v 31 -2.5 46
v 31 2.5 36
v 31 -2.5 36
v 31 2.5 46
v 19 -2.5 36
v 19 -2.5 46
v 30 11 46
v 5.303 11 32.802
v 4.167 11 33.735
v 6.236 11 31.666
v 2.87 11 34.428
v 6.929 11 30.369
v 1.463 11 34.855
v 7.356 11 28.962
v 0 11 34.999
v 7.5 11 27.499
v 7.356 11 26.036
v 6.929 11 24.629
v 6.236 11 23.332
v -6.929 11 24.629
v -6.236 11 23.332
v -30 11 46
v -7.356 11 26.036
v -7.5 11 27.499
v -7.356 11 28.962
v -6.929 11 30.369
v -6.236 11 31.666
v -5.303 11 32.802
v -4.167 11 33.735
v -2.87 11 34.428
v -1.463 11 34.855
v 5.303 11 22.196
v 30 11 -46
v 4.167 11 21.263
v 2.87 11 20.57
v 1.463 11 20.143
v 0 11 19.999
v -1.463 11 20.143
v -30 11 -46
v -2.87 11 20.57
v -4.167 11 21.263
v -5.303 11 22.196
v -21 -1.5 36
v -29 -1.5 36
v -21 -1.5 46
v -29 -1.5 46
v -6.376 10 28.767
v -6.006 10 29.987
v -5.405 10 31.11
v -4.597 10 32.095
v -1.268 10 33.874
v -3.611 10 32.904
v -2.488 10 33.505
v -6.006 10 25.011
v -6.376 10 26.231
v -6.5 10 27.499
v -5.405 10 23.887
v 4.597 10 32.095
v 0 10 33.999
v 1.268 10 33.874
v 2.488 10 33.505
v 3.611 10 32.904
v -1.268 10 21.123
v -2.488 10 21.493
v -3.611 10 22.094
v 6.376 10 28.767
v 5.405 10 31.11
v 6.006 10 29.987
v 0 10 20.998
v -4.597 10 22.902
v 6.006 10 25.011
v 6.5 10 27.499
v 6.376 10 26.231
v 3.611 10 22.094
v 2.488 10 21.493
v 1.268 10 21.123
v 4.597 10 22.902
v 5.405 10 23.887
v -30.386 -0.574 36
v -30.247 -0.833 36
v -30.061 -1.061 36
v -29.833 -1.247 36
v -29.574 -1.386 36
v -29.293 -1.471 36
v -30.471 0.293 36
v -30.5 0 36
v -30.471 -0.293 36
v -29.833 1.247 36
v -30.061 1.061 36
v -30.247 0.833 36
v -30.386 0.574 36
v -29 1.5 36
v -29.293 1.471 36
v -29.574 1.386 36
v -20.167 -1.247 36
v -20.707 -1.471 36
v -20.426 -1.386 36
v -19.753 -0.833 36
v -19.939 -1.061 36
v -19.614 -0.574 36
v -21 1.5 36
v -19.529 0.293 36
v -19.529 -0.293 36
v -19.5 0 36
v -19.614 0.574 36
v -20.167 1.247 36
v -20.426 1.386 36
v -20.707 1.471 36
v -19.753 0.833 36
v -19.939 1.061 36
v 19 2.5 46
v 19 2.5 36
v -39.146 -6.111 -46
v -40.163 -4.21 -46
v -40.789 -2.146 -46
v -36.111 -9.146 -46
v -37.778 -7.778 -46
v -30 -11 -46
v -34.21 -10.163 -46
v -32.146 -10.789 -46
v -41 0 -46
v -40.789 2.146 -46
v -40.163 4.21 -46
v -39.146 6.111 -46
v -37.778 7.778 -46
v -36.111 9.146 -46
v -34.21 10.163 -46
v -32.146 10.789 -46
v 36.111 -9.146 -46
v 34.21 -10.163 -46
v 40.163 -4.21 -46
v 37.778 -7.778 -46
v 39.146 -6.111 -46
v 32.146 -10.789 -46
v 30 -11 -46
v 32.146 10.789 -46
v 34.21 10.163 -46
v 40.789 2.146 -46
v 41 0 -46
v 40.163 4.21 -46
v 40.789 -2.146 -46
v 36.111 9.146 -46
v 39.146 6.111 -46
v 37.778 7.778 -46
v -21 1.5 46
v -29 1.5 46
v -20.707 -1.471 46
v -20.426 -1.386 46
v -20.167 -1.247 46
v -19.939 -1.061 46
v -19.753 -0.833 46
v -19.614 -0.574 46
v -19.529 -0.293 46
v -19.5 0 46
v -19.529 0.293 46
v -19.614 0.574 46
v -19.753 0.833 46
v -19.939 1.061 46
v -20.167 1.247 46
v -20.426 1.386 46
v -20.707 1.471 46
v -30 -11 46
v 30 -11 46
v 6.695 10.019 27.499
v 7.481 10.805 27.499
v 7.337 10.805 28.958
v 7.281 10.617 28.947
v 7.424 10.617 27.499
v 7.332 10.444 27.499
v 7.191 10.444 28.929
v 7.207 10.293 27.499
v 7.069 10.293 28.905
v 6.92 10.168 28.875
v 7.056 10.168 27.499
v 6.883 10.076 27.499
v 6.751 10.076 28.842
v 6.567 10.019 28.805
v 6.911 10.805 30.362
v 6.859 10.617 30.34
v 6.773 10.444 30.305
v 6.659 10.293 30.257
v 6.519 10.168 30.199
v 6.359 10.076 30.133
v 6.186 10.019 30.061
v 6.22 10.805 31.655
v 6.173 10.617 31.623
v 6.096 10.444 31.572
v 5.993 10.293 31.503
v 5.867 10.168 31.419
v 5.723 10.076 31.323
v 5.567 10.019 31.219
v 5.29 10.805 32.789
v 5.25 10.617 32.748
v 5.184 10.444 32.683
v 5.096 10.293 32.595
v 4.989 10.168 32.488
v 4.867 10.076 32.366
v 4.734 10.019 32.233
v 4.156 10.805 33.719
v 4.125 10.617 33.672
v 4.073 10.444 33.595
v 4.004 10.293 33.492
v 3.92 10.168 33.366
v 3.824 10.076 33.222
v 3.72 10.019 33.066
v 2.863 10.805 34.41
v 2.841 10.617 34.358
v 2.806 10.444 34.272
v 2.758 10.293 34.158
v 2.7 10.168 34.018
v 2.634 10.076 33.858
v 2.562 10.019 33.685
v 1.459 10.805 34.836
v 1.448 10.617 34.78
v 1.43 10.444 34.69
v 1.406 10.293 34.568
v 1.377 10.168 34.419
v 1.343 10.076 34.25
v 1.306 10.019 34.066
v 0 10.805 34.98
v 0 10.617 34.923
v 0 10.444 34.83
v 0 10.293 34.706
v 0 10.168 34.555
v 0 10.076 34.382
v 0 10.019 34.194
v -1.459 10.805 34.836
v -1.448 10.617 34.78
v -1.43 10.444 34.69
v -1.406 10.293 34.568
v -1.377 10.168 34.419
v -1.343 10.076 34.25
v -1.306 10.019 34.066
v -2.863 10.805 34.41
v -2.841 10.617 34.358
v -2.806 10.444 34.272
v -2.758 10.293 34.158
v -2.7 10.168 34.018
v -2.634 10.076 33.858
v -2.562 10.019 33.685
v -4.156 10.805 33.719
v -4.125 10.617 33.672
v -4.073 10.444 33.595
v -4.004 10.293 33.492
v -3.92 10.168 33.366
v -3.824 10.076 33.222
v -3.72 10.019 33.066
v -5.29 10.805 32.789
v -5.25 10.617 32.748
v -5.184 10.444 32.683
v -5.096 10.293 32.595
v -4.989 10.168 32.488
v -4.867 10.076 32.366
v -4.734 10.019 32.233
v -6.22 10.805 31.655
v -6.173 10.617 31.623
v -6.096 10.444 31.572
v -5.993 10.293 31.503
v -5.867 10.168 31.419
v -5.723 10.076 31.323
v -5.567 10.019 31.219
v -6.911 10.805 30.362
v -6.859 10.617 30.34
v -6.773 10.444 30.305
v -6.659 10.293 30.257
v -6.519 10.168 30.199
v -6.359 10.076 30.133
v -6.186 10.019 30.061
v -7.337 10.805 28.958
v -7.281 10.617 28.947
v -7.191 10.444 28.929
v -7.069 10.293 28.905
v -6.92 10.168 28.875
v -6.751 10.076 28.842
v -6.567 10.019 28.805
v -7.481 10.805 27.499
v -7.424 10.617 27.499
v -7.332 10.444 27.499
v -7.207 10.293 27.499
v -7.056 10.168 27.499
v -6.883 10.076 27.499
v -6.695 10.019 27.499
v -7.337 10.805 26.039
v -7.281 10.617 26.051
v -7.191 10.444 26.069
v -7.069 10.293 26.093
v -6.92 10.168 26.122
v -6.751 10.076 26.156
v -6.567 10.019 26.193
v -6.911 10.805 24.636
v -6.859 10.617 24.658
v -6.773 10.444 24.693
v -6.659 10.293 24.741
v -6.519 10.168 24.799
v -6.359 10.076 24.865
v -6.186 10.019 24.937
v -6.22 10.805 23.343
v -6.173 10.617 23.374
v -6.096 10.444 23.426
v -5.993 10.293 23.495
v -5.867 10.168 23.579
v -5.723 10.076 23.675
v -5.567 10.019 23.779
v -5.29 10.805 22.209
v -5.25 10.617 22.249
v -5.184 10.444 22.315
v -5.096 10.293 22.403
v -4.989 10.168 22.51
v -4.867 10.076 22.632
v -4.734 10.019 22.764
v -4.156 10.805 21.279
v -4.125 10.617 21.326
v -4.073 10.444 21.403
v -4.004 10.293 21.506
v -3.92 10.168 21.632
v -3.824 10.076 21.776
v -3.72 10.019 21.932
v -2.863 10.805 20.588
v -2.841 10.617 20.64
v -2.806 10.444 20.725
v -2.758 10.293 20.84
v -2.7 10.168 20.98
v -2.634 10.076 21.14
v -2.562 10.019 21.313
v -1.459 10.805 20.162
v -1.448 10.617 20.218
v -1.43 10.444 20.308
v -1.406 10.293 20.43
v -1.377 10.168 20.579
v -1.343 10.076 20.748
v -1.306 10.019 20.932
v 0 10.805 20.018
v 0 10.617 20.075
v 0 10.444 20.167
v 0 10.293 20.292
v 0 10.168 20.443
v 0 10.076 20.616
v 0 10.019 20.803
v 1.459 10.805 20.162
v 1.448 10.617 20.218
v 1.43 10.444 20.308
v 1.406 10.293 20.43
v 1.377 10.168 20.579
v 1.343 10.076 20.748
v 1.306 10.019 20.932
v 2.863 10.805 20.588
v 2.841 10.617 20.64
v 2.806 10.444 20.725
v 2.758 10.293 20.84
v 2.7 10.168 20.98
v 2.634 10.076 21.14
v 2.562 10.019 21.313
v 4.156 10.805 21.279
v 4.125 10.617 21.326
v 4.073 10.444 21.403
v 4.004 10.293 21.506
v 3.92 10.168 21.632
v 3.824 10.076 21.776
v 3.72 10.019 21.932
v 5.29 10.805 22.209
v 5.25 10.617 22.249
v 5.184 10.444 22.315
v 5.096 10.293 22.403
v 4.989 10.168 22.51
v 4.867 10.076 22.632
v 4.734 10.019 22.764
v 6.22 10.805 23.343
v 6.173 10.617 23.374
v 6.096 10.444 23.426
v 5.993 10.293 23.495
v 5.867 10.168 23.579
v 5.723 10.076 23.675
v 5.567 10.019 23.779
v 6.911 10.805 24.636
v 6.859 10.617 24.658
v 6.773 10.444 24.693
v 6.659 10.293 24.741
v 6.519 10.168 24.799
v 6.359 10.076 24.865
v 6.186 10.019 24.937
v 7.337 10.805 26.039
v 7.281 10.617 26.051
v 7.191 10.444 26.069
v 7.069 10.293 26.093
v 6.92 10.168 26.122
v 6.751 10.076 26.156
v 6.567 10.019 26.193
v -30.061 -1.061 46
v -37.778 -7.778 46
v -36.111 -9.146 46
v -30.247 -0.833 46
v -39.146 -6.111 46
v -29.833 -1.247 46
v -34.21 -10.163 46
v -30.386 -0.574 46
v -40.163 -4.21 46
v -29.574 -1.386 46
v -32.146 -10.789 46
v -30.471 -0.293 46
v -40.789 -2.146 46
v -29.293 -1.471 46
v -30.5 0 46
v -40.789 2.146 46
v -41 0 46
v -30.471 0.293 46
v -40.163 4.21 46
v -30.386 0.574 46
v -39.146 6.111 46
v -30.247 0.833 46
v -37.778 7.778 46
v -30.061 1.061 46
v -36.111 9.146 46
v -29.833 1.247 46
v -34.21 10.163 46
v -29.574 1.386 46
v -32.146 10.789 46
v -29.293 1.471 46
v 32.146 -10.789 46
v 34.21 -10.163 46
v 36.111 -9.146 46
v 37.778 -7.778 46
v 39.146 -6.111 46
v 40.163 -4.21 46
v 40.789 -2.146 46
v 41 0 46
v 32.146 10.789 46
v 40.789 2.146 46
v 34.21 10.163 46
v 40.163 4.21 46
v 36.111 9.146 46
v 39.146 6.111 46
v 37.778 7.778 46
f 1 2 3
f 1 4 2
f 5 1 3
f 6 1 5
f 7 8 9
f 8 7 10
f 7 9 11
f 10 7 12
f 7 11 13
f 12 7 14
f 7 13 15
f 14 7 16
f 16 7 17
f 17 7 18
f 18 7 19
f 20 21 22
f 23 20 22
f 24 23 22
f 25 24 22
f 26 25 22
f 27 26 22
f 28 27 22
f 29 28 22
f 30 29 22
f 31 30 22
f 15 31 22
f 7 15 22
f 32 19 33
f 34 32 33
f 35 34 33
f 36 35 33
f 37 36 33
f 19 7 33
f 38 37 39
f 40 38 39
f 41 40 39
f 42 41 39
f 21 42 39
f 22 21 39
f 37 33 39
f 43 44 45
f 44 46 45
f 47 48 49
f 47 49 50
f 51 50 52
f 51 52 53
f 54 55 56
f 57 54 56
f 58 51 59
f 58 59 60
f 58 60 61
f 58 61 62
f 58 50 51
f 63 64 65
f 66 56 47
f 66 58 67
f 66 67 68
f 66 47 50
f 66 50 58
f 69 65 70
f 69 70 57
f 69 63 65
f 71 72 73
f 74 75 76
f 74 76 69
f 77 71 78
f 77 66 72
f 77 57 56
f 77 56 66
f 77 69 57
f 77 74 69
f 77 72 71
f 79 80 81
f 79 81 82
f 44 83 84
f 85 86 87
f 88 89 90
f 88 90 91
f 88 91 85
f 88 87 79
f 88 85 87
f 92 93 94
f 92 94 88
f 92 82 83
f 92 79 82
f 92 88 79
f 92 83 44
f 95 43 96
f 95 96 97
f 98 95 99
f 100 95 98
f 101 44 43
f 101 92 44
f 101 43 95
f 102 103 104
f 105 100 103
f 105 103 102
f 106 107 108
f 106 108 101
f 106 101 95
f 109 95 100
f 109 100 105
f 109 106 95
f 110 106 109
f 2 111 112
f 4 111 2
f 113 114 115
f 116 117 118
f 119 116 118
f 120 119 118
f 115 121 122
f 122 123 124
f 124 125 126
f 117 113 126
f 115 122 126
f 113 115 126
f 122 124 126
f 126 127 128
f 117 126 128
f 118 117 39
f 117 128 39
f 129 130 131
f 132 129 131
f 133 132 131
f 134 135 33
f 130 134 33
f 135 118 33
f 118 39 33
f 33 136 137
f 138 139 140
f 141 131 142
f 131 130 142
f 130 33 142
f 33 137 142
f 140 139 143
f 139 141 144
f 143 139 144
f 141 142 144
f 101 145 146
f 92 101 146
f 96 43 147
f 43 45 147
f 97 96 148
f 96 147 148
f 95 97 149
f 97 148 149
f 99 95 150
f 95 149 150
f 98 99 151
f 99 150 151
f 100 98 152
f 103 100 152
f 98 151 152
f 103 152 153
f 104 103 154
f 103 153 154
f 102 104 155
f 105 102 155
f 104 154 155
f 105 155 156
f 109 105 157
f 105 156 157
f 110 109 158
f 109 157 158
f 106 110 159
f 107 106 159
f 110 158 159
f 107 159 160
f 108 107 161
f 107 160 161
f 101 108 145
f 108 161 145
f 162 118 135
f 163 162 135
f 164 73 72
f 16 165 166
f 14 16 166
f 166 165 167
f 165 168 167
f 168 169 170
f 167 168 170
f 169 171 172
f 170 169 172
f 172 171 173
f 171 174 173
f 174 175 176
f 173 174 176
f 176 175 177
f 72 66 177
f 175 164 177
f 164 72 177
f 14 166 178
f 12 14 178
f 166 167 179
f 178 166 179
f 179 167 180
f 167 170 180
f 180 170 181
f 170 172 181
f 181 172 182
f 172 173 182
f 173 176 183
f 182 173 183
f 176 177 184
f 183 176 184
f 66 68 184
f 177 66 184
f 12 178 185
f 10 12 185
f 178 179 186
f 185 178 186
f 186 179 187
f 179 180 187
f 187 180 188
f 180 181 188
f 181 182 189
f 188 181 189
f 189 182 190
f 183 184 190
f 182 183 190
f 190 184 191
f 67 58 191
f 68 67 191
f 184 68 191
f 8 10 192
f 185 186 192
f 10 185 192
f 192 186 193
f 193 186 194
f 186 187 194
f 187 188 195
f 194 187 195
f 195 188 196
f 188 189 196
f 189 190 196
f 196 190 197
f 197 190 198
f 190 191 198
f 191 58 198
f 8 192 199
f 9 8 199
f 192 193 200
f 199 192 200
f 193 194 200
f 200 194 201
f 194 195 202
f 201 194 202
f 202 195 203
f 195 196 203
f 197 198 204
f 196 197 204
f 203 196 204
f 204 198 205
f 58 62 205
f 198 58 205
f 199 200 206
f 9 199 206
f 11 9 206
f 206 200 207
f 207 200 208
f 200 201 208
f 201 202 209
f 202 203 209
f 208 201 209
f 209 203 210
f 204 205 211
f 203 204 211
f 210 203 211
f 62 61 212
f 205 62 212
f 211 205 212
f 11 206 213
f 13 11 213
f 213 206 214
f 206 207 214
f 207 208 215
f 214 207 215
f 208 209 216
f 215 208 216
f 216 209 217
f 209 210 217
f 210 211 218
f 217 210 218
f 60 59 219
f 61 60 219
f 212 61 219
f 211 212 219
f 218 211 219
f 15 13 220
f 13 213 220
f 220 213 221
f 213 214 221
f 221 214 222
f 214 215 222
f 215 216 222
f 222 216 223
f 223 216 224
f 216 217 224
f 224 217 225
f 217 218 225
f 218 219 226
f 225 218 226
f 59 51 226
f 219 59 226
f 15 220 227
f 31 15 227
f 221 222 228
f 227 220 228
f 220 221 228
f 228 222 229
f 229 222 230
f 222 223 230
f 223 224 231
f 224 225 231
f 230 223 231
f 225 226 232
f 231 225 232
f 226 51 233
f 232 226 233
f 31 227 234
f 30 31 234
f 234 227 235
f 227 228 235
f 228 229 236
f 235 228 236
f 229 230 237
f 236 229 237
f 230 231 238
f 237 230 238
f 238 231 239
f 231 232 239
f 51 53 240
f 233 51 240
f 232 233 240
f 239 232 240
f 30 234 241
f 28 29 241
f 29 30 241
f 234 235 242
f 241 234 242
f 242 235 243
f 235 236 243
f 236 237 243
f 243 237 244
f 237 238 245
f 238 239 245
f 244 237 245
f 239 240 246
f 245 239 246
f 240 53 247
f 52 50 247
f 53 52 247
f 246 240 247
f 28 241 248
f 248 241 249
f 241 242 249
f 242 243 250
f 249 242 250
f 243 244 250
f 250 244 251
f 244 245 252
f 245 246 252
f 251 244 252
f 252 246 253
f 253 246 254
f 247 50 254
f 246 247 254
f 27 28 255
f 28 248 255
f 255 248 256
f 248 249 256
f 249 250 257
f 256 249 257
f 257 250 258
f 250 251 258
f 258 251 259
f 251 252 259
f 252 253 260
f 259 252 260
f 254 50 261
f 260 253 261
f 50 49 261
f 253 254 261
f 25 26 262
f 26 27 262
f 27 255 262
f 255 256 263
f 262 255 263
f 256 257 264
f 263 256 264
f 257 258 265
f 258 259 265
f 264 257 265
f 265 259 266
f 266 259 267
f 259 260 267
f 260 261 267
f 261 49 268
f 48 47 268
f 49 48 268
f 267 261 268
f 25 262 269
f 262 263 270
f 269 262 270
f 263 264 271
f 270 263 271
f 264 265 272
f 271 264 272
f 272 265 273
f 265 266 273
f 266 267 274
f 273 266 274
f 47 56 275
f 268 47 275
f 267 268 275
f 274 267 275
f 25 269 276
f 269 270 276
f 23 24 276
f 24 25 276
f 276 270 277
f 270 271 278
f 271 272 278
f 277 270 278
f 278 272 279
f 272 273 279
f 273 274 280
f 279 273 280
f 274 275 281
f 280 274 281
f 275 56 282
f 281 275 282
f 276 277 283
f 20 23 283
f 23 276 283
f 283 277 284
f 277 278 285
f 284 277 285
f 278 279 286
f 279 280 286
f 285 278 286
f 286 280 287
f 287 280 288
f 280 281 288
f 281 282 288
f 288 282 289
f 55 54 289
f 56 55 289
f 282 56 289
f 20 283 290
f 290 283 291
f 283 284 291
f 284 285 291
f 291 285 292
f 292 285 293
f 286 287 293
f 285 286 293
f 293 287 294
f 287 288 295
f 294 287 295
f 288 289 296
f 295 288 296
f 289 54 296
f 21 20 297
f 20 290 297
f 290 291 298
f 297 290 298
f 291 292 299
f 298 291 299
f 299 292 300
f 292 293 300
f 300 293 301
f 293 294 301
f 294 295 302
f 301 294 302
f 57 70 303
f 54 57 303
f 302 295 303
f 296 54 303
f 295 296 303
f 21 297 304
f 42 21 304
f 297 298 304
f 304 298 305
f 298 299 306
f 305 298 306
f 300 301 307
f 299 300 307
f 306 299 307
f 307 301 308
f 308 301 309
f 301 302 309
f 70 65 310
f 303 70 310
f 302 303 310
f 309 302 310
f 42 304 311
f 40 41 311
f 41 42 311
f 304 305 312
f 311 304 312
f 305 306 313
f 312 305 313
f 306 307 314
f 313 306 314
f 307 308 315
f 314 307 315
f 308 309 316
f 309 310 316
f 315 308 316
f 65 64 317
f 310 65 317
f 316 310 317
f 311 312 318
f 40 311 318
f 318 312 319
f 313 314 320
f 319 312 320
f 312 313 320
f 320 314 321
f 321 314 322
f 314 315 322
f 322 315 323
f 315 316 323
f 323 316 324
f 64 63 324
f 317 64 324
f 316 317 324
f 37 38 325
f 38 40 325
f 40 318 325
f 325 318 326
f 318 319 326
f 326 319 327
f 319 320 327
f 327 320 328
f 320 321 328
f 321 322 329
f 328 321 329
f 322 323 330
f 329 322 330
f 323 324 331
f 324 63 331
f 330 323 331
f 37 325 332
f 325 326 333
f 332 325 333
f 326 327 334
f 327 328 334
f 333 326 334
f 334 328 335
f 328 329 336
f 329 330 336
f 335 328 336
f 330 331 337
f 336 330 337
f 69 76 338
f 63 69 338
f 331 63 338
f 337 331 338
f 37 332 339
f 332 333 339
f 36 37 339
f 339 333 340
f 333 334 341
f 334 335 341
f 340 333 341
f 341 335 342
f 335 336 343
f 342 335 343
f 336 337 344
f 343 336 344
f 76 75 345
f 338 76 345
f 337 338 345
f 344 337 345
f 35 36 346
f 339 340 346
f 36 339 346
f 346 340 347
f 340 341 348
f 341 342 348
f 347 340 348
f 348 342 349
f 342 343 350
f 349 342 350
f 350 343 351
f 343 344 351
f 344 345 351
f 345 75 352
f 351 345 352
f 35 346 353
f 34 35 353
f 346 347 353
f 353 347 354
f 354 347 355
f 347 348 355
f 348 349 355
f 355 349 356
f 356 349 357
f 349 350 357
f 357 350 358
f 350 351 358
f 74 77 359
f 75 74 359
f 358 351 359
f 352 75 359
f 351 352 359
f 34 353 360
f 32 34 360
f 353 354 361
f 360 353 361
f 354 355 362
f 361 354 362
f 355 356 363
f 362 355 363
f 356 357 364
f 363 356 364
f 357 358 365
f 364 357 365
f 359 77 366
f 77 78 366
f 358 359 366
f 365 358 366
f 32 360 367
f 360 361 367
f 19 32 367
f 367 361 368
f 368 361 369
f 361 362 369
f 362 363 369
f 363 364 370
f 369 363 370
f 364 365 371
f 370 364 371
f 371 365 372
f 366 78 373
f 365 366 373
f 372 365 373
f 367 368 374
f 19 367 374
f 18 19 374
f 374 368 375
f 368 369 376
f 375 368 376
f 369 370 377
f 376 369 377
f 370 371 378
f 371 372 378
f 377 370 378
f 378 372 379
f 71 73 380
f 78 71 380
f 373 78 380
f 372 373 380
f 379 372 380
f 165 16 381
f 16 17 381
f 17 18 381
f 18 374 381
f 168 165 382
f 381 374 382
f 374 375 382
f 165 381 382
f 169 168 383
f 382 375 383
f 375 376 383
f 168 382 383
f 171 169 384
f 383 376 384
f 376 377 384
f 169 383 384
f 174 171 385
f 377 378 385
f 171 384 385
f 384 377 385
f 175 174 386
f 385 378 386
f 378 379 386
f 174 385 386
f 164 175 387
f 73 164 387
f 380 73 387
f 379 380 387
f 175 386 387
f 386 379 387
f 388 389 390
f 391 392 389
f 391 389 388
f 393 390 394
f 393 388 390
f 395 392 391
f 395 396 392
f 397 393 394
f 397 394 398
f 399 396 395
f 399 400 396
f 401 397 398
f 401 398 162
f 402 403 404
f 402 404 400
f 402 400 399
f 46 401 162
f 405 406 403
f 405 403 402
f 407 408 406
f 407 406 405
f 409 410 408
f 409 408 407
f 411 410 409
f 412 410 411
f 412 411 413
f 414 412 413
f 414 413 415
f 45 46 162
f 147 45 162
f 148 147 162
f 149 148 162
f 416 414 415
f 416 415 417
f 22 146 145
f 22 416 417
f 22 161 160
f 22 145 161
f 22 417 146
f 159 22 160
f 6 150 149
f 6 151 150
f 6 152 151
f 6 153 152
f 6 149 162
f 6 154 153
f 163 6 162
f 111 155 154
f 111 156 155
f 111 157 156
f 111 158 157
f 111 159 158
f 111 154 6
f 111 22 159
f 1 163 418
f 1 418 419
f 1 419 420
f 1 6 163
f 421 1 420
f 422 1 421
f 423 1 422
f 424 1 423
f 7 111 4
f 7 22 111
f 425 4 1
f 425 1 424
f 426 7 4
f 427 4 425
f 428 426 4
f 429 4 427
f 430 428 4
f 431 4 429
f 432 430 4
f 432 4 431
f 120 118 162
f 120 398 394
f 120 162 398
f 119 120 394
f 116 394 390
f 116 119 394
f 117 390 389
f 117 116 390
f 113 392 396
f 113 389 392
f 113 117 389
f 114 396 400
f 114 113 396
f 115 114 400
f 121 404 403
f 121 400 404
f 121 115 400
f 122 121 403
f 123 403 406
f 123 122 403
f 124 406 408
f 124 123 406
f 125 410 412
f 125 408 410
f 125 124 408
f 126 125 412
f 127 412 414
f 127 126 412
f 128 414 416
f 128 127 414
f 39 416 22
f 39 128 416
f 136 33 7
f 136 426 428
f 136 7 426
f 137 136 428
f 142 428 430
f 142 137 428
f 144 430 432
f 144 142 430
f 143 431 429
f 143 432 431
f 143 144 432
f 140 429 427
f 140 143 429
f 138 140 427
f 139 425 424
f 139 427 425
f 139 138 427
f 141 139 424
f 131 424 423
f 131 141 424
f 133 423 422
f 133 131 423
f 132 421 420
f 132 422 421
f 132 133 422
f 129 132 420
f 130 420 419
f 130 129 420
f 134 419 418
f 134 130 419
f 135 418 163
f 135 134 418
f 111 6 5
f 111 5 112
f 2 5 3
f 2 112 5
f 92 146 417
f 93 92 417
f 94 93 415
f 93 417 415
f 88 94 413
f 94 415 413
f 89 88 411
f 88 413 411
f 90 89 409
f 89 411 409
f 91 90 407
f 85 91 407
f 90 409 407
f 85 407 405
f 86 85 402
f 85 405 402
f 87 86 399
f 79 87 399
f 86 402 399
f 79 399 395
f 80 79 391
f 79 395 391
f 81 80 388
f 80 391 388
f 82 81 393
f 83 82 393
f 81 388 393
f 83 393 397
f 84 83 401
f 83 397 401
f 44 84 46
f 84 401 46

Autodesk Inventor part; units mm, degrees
ref_plane "YZ Plane" through (0, 0, 0) normal (1, 0, 0) x (0, 1, 0)
ref_plane "XZ Plane" through (0, 0, 0) normal (0, 1, 0) x (-1, 0, 0)
ref_plane "XY Plane" through (0, 0, 0) normal (0, 0, 1) x (1, 0, 0)
sketch "Sketch1" plane through (0, 0, 0) normal (0, 0, 1) x (1, 0, 0)
  line L0 (-30, 0) -> (30, 0) construction
  line L1 (-30, -11) -> (30, -11)
  line L2 (30, 11) -> (-30, 11)
  arc A0 (-30, 11) -> (-30, -11) centre (-30, 0) ccw
  arc A1 (30, -11) -> (30, 11) centre (30, 0) ccw
  point P0 (0, 0)
  point P1 (0, 0)
  dimension "d0" = 22
  dimension "d1" = 60
extrude "Extrusion1" add sketch "Sketch1" along normal mid plane 92
sketch "Sketch2" plane through (0, 0, 46) normal (0, 0, 1) x (1, 0, 0)
  line L0 (19, 2.5) -> (31, 2.5)
  line L1 (31, 2.5) -> (31, -2.5)
  line L2 (31, -2.5) -> (19, -2.5)
  line L3 (19, -2.5) -> (19, 2.5)
  line L4 (19, 2.5) -> (31, -2.5) construction
  line L5 (31, 2.5) -> (19, -2.5) construction
  arc A0 (30, -11) -> (30, 11) centre (30, 0) ccw projected
  line L6 (30, 11) -> (-30, 11) projected
  arc A1 (-30, 11) -> (-30, -11) centre (-30, 0) ccw projected
  line L7 (-30, -11) -> (30, -11) projected
  line L8 (-29, 0) -> (-21, 0) construction
  line L9 (-29, -1.5) -> (-21, -1.5)
  line L10 (-21, 1.5) -> (-29, 1.5)
  arc A2 (-29, 1.5) -> (-29, -1.5) centre (-29, 0) ccw
  arc A3 (-21, -1.5) -> (-21, 1.5) centre (-21, 0) ccw
  point P0 (0, 0)
  point P1 (25, 0)
  point P2 (-25, 0)
  dimension "d4" = 5
  dimension "d5" = 12
  dimension "d6" = 25
  dimension "d13" = 3
  dimension "d14" = 8
  dimension "d15" = 25
extrude "Extrusion2" cut sketch "Sketch2" against normal blind 10 contours L0 L1 L2 L3 | A2 L10 A3 L9
sketch "Sketch3" plane through (-30, 11, 46) normal (0, 1, 0) x (1, 0, 0)
  circle A0 centre (30, 18.5011) radius 7.5
  point P0 (30, 46)
  dimension "d9" = 15
extrude "Extrusion3" cut sketch "Sketch3" against normal blind 1
fillet "Fillet1" radius 1 1 edges at (-7.5, 10, 27.4989)
properties part number "power-bank"
